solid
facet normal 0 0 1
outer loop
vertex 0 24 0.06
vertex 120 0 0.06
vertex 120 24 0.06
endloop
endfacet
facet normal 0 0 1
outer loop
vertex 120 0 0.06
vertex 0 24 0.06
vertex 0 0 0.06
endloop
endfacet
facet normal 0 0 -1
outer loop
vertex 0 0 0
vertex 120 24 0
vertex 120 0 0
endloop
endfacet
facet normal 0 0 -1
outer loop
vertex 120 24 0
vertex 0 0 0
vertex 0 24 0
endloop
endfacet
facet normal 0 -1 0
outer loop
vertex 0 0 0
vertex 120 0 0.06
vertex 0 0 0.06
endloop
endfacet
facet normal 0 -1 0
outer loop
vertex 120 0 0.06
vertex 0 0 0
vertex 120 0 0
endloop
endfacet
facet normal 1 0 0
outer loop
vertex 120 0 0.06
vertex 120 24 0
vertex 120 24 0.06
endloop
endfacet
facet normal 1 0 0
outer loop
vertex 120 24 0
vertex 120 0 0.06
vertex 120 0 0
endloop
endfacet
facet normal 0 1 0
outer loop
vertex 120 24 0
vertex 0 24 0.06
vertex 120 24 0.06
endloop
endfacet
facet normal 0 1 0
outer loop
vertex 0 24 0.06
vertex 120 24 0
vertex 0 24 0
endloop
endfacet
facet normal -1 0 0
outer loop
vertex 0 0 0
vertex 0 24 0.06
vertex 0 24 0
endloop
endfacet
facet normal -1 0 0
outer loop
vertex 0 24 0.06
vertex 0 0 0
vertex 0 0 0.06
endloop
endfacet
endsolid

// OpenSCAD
$fn=96;

// Sellotape-like tape sheet (a thin rectangular strip)
tape_length = 120;
tape_width  = 24;
tape_thick  = 0.06;

// Slightly translucent amber color typical of clear tape
color([1.0, 0.85, 0.45, 0.35])
cube([tape_length, tape_width, tape_thick], center=false);
